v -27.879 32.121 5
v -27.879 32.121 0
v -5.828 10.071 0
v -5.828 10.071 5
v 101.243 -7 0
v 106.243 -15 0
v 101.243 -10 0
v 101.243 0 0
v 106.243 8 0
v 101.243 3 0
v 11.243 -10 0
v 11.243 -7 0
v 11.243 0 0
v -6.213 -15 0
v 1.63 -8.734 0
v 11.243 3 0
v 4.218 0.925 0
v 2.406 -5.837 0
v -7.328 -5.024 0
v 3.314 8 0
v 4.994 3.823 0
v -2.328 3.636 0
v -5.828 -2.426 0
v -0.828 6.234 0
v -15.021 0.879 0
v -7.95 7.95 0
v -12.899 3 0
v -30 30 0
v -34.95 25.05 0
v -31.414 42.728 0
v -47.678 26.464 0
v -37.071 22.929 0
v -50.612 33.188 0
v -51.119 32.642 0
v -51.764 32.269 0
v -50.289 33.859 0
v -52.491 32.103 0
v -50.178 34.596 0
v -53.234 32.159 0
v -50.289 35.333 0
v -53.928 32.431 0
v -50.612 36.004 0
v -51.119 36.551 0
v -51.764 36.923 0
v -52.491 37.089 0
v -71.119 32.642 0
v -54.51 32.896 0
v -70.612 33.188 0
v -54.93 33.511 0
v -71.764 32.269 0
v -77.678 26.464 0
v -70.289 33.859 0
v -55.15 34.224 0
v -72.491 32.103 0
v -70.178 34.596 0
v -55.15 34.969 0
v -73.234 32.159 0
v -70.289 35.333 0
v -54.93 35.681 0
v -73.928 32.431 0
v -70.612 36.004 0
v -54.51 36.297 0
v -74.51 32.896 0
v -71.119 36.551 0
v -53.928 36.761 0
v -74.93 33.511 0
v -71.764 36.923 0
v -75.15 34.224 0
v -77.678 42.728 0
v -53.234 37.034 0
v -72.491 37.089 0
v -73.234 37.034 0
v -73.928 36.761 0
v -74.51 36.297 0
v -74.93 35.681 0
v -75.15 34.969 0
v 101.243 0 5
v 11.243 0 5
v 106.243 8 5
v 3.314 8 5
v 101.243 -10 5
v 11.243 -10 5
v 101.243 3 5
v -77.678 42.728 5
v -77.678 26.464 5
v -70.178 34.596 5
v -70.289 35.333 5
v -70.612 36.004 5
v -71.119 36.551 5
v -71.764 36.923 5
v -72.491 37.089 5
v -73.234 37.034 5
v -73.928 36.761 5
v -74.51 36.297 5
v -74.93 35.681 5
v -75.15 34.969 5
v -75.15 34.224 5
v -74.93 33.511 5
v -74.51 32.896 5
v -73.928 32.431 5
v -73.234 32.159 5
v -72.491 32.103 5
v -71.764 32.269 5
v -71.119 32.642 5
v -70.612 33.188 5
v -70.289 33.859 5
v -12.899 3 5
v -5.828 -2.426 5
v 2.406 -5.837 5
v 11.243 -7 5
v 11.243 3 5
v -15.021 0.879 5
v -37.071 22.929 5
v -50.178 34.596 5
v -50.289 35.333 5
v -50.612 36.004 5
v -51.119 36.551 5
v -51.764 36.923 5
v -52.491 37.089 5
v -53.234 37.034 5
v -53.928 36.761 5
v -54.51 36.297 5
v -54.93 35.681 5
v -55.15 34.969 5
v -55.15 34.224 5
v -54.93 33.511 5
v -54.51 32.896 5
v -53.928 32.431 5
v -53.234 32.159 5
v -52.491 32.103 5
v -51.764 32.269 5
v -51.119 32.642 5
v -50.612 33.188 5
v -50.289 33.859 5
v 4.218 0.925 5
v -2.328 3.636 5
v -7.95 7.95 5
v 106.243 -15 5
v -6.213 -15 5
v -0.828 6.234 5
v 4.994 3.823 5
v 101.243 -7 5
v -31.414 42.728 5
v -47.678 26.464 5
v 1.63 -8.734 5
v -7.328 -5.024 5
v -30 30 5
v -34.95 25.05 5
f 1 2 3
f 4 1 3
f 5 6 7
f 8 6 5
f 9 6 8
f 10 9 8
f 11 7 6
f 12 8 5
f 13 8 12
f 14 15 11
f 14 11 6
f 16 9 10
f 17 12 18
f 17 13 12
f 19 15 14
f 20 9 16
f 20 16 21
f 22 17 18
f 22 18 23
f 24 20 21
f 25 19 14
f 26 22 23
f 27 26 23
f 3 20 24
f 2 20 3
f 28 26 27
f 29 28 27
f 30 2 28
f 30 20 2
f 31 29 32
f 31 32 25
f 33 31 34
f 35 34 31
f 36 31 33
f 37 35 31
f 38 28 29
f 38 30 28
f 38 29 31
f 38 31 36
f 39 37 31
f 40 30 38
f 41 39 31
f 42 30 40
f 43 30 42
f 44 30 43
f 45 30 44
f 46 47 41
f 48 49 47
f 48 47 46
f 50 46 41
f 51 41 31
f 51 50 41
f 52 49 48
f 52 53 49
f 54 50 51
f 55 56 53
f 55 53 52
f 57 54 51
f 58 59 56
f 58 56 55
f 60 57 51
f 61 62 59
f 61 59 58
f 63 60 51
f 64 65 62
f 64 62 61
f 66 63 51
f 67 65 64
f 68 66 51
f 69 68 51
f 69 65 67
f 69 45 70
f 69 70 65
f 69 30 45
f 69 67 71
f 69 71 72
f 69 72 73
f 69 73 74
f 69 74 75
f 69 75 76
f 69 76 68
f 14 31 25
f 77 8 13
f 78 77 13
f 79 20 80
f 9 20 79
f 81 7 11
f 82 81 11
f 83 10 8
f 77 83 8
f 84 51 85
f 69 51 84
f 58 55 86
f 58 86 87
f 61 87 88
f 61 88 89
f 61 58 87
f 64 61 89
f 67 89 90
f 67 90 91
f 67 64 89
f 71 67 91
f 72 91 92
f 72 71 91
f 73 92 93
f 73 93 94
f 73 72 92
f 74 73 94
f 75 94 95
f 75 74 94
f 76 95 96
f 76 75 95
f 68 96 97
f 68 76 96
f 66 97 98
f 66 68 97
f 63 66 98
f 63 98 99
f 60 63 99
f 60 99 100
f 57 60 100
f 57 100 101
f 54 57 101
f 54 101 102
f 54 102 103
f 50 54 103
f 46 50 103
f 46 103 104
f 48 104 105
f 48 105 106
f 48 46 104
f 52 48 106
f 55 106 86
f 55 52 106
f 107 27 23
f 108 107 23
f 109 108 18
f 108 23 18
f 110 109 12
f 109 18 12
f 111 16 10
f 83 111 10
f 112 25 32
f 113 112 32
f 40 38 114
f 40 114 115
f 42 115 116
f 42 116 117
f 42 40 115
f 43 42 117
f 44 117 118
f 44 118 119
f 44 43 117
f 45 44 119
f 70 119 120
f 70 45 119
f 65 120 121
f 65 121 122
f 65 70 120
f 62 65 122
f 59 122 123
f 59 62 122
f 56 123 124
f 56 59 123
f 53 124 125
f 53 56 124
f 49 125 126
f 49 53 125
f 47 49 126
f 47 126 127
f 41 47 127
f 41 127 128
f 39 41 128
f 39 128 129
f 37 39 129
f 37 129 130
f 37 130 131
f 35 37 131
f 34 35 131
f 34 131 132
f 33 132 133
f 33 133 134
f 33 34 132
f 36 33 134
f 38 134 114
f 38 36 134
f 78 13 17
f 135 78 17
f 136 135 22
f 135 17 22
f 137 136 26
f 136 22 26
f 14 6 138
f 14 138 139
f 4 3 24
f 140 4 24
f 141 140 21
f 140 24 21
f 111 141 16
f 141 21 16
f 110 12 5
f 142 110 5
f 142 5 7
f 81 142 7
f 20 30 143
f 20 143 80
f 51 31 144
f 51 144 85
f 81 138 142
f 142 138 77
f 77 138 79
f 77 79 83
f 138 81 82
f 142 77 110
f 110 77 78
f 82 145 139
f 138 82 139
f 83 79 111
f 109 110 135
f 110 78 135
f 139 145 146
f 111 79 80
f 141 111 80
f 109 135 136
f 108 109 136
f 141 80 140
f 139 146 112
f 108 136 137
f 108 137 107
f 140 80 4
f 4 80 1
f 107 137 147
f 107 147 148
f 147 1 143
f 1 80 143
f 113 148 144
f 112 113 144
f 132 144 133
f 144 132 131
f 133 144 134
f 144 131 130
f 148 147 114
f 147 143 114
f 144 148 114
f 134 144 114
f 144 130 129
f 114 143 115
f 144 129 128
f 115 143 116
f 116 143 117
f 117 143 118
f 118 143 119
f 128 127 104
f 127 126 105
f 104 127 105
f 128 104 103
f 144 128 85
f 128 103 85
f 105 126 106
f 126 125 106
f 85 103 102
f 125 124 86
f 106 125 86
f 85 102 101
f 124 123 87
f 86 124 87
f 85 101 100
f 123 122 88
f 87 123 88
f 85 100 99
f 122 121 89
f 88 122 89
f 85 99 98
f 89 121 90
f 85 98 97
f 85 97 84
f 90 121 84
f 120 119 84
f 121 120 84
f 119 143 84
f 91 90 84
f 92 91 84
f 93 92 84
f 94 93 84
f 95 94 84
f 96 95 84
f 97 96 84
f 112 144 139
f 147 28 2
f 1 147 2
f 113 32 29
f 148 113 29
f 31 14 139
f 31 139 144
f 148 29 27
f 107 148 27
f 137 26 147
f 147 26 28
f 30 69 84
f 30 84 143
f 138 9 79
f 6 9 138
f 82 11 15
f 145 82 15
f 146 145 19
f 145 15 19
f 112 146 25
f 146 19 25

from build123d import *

# Parameters (mm, degrees)
SKETCH2_R           = 2.5
BOSS_EXTRUDE1_DEPTH = 5


with BuildPart() as part:
    # Sketch2 → Boss-Extrude1 (new body)
    with BuildSketch(Plane.XY):
        Polygon((-31.414213562, 42.727922061), (3.313708499, 8), (106.242640687, 8), (106.242640687, -15), (-6.213203436, -15), (-47.67766953, 26.464466094), (-77.67766953, 26.464466094), (-77.67766953, 42.727922061), align=None)
        with Locations((-72.67766953, 34.596194078)):
            Circle(SKETCH2_R, mode=Mode.SUBTRACT)
        with Locations((-52.67766953, 34.596194078)):
            Circle(SKETCH2_R, mode=Mode.SUBTRACT)
        with BuildLine():
            Line((-27.878679656, 32.121320344), (-5.828427125, 10.071067812))
            ThreePointArc((-5.828427125, 10.071067812), (2.003845362, 4.83771065), (11.242640687, 3))
            Line((11.242640687, 3), (101.242640687, 3))
            Line((101.242640687, 3), (101.242640687, 0))
            Line((101.242640687, 0), (11.242640687, 0))
            ThreePointArc((11.242640687, 0), (0.855795065, 2.066072052), (-7.949747468, 7.949747468))
            Line((-7.949747468, 7.949747468), (-30, 30))
            Line((-30, 30), (-27.878679656, 32.121320344))
        make_face(mode=Mode.SUBTRACT)
        with BuildLine():
            Line((-34.949747468, 25.050252532), (-12.899494937, 3))
            ThreePointArc((-12.899494937, 3), (-1.822988962, -4.401084675), (11.242640687, -7))
            Line((11.242640687, -7), (101.242640687, -7))
            Line((101.242640687, -7), (101.242640687, -10))
            Line((101.242640687, -10), (11.242640687, -10))
            ThreePointArc((11.242640687, -10), (-2.971039259, -7.172723273), (-15.02081528, 0.878679656))
            Line((-15.02081528, 0.878679656), (-37.071067812, 22.928932188))
            Line((-37.071067812, 22.928932188), (-34.949747468, 25.050252532))
        make_face(mode=Mode.SUBTRACT)
    extrude(amount=BOSS_EXTRUDE1_DEPTH)


solid = part.part
